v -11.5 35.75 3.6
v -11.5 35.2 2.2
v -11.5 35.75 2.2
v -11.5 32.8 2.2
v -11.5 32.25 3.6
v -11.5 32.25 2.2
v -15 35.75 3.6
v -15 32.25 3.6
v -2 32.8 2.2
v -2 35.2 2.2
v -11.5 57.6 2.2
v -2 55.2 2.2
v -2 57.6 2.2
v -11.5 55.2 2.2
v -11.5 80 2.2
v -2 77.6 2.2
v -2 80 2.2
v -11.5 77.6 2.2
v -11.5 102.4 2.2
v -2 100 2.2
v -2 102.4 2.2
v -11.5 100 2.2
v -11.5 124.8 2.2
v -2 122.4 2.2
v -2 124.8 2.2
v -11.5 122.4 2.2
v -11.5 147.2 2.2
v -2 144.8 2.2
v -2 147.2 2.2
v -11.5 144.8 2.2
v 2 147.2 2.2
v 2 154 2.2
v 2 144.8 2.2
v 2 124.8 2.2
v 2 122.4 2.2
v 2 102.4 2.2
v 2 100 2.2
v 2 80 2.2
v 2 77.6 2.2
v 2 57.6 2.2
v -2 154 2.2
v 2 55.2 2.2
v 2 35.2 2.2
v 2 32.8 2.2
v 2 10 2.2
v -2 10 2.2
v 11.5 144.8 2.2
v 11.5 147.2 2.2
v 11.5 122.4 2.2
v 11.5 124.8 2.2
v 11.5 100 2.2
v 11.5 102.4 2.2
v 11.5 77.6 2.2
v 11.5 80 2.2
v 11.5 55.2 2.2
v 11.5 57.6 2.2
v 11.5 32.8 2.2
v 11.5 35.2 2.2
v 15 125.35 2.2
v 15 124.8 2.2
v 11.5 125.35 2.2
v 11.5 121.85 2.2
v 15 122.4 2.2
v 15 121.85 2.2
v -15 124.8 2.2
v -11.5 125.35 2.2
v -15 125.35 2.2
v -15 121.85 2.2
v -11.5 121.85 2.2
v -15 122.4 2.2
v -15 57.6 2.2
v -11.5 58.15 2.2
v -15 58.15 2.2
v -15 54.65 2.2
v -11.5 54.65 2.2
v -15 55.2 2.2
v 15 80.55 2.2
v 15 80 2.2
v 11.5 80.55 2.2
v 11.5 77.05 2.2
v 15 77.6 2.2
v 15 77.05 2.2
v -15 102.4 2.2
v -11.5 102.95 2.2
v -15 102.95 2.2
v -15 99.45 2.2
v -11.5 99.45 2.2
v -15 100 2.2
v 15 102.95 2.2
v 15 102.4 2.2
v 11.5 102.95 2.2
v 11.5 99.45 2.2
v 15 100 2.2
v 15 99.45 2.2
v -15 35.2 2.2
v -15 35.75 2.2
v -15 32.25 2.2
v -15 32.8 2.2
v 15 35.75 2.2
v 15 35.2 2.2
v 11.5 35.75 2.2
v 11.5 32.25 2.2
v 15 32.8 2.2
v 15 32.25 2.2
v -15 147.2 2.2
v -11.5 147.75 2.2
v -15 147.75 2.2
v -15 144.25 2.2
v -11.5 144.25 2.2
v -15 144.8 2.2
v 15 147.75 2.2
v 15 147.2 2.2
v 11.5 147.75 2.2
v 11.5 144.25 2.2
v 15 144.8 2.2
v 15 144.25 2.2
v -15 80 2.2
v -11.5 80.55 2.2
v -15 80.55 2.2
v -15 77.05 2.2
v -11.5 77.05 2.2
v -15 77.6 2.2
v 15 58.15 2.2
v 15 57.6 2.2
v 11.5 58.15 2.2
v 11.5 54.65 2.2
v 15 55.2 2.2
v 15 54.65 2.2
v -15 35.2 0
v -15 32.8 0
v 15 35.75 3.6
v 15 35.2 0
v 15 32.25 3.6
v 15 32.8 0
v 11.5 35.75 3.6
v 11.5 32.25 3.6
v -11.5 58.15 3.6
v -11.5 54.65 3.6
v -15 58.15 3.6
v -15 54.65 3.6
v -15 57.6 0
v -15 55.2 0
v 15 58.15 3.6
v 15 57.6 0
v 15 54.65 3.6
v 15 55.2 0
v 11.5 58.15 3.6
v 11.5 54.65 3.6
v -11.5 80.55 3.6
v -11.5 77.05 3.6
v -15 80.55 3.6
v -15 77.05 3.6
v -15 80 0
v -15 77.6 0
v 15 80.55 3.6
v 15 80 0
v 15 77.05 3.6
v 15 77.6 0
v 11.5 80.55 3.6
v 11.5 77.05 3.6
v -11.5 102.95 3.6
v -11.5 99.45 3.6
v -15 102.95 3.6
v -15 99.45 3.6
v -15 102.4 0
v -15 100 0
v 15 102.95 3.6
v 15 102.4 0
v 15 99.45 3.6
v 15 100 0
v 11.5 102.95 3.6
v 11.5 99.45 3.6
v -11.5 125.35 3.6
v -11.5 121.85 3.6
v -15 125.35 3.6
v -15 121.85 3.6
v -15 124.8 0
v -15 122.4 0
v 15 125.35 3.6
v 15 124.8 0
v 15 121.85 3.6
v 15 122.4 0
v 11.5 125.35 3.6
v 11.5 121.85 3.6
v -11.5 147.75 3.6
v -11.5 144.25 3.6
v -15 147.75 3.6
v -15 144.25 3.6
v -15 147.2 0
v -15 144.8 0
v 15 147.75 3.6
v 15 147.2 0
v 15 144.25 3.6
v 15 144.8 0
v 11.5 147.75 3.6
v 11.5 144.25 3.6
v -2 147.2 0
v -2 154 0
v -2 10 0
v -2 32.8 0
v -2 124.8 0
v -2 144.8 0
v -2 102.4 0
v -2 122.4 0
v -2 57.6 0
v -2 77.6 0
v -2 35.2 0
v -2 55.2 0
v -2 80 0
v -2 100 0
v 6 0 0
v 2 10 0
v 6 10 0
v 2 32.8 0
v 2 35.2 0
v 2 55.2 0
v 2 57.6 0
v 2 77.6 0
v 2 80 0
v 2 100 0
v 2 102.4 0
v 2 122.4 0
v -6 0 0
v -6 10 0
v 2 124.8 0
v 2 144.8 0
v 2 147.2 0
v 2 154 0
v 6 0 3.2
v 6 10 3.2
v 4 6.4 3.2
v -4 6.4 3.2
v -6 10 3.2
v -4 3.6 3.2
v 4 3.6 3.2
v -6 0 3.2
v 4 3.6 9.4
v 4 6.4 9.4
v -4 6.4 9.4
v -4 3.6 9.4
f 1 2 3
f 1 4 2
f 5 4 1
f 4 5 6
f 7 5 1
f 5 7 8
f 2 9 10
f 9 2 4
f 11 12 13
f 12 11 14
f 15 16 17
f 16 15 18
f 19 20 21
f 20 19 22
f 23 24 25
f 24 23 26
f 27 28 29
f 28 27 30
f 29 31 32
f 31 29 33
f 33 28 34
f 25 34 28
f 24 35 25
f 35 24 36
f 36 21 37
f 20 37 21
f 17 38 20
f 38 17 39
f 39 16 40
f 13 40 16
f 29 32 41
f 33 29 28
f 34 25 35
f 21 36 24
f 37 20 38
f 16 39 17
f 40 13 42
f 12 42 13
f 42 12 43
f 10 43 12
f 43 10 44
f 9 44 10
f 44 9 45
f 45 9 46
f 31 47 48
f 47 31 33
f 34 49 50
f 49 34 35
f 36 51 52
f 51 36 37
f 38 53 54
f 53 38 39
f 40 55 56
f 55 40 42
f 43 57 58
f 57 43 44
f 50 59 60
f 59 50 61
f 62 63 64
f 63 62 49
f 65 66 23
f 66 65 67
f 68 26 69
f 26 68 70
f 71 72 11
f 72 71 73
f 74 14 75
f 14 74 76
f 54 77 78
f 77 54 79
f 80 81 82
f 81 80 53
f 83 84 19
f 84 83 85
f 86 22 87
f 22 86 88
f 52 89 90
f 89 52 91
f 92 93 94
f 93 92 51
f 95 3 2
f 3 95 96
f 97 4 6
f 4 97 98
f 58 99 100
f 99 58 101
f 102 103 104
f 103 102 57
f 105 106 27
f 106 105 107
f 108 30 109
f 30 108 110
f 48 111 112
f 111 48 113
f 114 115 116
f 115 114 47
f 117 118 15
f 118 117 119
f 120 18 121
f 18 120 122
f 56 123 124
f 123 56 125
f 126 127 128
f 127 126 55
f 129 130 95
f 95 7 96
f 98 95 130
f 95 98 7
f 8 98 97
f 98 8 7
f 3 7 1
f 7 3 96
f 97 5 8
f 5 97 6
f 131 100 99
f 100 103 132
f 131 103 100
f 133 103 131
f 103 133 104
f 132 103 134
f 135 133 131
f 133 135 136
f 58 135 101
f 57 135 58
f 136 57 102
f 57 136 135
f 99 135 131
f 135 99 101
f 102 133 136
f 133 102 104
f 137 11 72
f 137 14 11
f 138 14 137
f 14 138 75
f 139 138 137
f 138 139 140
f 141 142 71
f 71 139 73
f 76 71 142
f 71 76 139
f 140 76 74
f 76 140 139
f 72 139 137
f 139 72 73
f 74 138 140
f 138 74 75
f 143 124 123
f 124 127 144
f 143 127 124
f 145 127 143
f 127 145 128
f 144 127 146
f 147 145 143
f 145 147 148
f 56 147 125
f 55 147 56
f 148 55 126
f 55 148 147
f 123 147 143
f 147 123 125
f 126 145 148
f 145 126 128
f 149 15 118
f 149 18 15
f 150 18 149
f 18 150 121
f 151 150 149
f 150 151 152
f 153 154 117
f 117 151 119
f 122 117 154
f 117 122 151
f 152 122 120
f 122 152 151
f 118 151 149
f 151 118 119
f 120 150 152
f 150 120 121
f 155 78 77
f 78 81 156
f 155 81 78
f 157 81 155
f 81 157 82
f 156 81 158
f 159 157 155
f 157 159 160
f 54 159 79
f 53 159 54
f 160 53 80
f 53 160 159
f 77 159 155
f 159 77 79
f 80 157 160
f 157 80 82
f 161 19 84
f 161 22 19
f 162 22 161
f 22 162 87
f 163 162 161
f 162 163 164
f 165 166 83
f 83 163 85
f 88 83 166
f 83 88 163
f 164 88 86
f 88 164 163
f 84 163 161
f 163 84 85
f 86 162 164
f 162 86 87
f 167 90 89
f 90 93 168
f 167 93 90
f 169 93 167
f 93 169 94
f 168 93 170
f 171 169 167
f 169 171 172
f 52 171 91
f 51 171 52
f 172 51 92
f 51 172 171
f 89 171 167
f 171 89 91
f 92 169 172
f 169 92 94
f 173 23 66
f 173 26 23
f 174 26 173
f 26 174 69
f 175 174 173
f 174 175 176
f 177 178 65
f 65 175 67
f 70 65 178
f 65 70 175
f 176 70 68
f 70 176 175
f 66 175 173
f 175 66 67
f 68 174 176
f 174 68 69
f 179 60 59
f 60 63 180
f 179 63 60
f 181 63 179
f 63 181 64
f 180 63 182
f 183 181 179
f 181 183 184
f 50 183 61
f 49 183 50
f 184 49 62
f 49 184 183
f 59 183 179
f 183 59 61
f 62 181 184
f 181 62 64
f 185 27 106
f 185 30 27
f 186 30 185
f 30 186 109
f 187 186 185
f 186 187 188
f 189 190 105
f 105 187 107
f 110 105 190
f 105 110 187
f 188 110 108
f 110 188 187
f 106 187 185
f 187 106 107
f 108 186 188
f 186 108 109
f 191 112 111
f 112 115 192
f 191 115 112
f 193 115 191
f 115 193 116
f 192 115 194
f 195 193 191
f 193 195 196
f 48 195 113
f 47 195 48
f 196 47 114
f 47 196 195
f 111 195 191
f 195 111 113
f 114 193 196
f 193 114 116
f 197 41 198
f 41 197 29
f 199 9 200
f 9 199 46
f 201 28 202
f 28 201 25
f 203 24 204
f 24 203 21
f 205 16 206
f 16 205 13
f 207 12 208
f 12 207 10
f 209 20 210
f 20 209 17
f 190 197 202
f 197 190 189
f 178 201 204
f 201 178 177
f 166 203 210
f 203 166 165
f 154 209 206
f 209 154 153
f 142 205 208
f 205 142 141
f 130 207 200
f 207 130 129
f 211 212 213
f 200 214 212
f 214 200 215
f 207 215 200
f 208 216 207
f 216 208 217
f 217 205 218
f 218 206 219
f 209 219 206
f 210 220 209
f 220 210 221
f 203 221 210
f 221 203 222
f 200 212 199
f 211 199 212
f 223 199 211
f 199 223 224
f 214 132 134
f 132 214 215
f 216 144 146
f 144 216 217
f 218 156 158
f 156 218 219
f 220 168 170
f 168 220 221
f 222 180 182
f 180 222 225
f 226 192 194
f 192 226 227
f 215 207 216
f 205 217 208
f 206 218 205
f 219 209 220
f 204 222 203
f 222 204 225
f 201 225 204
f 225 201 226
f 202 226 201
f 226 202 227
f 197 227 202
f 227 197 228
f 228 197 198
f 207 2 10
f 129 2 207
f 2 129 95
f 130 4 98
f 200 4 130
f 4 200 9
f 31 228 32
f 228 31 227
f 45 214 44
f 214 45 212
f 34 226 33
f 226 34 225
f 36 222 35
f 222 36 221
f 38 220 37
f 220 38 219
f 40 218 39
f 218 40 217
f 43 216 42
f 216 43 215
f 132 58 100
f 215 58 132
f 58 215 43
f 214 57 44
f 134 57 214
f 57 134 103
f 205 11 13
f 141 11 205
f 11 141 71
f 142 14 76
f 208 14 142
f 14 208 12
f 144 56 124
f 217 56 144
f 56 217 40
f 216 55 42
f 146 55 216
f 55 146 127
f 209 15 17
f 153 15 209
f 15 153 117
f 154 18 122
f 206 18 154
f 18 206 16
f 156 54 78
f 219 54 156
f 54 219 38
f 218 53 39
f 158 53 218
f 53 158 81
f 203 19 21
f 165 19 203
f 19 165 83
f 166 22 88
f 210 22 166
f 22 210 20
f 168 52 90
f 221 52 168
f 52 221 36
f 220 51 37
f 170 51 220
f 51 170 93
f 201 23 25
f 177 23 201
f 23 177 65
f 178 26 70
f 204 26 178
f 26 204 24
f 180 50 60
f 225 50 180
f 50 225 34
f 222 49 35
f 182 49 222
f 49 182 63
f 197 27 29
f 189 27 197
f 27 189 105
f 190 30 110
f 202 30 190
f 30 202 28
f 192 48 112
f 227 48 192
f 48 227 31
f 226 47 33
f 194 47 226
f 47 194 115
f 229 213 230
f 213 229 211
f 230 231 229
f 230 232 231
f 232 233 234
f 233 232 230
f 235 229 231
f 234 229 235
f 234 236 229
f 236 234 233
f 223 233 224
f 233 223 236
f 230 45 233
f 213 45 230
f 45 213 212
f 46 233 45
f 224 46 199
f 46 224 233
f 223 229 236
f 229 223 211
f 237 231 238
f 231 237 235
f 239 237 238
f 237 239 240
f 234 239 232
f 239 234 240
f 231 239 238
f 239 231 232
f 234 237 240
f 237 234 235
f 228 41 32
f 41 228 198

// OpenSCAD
// 19_squelette_TPU_x8.scad
// EXO-MEDUSA v6.2 — piece 19 "squelette TPU" x8  (Fin-Ray ladder)
//
// THIS IS A RECONSTRUCTION. tentacule_v62.scad is NOT in the zip.
// 21_flanc_superieur_TPU_x8.stl is a one-piece TPU flank (strip+paddle+slot tab),
// NOT this skeleton — do not print 21 as piece 19.
//
// Print: TPU 95A, a plat, 30 mm/s max, x8, 1-2 plates. (NOTICE etape 0)
// First print ONE, overlay GABARIT_FLANCS_1-1.pdf, then tweak b1_y / sp_t.
//
// openscad -o 19_squelette_TPU_x8.stl 19_squelette_TPU_x8.scad

/* [spine — NOTICE etape 10 sp_t band; thickness from part 21] */
sp_t = 2.2;           // mm  SOURCE part 21 spine z=2.2. NOTICE: 2.6 too soft, 1.8 too stiff
sp_w = 4.0;           // mm  SOURCE part 21 spine x=-2..2

/* [bars — GABARIT_FLANCS_1-1.pdf v6.3] */
n_bars    = 6;    // gabarit "6 lames" B1-B6. NOTICE "14 patins" would be 7; keep 6.
bar_pitch = 22.4; // mm  SOURCE gabarit B spacing (63.4962 pt = 22.40 mm)
b1_film   = 60.0;   // mm  SOURCE gabarit B1 from film teton bottom
ring_sep  = 36.0;  // mm  EST vertical+radial gap barrette ring -> slider ring
                         //     (rotor cup z~174, cam groove ~z154, stator ring z190, dr=6)
b1_y      = b1_film - ring_sep;  // = 24.0 mm with defaults
bar_span  = 30.0;  // mm  SOURCE gabarit film body width 30.00
bar_w     = 2.4;     // mm  EST printable TPU rib width
bar_t     = 2.2;     // mm  same layer as spine

/* [pads — NOTICE etape 9 "patins carres", glue ONLY here] */
pad   = 3.5;           // mm  EST "petits patins carres"
pad_h = 1.4;         // mm  EST rise so film does not touch spine/bars

/* [root teton — sliding ring 09s, fentes 8.6 x 3.0 x sl_t=6] */
tab_w = 8.0;         // SOURCE medusa_v6.scad clamp tab_w / part 21
tab_t = 2.8;         // SOURCE tab_t 2.8
tab_h = 6.2;      // sl_t=6 + 0.2 glue. NOTICE: 2 mm play eats half the stroke
root_w = 12.0;
root_l = 10.0;
root_h = 3.2;       // SOURCE part 21 root plate 3.2
tail   = 8.0;         // mm  EST past B6

$fn = 24;

module squelette() {
    // root plate
    translate([-root_w/2, 0, 0]) cube([root_w, root_l, root_h]);
    // teton (+Z) — insert from below into anneau coulissant
    translate([-tab_w/2, (root_l-tab_t)/2, root_h]) cube([tab_w, tab_t, tab_h]);
    // spine
    spine_len = b1_y + (n_bars-1)*bar_pitch + tail;
    translate([-sp_w/2, root_l, 0]) cube([sp_w, spine_len, sp_t]);
    // bars + pads
    arm = (bar_span - sp_w)/2;
    for (i=[0:n_bars-1]) {
        y = root_l + b1_y + i*bar_pitch;
        translate([-bar_span/2, y-bar_w/2, 0]) cube([arm, bar_w, bar_t]);
        translate([ sp_w/2,     y-bar_w/2, 0]) cube([arm, bar_w, bar_t]);
        for (s=[-1,1])
            translate([s*(bar_span/2-pad/2)-pad/2, y-pad/2, bar_t])
                cube([pad, pad, pad_h]);
    }
}

squelette();
